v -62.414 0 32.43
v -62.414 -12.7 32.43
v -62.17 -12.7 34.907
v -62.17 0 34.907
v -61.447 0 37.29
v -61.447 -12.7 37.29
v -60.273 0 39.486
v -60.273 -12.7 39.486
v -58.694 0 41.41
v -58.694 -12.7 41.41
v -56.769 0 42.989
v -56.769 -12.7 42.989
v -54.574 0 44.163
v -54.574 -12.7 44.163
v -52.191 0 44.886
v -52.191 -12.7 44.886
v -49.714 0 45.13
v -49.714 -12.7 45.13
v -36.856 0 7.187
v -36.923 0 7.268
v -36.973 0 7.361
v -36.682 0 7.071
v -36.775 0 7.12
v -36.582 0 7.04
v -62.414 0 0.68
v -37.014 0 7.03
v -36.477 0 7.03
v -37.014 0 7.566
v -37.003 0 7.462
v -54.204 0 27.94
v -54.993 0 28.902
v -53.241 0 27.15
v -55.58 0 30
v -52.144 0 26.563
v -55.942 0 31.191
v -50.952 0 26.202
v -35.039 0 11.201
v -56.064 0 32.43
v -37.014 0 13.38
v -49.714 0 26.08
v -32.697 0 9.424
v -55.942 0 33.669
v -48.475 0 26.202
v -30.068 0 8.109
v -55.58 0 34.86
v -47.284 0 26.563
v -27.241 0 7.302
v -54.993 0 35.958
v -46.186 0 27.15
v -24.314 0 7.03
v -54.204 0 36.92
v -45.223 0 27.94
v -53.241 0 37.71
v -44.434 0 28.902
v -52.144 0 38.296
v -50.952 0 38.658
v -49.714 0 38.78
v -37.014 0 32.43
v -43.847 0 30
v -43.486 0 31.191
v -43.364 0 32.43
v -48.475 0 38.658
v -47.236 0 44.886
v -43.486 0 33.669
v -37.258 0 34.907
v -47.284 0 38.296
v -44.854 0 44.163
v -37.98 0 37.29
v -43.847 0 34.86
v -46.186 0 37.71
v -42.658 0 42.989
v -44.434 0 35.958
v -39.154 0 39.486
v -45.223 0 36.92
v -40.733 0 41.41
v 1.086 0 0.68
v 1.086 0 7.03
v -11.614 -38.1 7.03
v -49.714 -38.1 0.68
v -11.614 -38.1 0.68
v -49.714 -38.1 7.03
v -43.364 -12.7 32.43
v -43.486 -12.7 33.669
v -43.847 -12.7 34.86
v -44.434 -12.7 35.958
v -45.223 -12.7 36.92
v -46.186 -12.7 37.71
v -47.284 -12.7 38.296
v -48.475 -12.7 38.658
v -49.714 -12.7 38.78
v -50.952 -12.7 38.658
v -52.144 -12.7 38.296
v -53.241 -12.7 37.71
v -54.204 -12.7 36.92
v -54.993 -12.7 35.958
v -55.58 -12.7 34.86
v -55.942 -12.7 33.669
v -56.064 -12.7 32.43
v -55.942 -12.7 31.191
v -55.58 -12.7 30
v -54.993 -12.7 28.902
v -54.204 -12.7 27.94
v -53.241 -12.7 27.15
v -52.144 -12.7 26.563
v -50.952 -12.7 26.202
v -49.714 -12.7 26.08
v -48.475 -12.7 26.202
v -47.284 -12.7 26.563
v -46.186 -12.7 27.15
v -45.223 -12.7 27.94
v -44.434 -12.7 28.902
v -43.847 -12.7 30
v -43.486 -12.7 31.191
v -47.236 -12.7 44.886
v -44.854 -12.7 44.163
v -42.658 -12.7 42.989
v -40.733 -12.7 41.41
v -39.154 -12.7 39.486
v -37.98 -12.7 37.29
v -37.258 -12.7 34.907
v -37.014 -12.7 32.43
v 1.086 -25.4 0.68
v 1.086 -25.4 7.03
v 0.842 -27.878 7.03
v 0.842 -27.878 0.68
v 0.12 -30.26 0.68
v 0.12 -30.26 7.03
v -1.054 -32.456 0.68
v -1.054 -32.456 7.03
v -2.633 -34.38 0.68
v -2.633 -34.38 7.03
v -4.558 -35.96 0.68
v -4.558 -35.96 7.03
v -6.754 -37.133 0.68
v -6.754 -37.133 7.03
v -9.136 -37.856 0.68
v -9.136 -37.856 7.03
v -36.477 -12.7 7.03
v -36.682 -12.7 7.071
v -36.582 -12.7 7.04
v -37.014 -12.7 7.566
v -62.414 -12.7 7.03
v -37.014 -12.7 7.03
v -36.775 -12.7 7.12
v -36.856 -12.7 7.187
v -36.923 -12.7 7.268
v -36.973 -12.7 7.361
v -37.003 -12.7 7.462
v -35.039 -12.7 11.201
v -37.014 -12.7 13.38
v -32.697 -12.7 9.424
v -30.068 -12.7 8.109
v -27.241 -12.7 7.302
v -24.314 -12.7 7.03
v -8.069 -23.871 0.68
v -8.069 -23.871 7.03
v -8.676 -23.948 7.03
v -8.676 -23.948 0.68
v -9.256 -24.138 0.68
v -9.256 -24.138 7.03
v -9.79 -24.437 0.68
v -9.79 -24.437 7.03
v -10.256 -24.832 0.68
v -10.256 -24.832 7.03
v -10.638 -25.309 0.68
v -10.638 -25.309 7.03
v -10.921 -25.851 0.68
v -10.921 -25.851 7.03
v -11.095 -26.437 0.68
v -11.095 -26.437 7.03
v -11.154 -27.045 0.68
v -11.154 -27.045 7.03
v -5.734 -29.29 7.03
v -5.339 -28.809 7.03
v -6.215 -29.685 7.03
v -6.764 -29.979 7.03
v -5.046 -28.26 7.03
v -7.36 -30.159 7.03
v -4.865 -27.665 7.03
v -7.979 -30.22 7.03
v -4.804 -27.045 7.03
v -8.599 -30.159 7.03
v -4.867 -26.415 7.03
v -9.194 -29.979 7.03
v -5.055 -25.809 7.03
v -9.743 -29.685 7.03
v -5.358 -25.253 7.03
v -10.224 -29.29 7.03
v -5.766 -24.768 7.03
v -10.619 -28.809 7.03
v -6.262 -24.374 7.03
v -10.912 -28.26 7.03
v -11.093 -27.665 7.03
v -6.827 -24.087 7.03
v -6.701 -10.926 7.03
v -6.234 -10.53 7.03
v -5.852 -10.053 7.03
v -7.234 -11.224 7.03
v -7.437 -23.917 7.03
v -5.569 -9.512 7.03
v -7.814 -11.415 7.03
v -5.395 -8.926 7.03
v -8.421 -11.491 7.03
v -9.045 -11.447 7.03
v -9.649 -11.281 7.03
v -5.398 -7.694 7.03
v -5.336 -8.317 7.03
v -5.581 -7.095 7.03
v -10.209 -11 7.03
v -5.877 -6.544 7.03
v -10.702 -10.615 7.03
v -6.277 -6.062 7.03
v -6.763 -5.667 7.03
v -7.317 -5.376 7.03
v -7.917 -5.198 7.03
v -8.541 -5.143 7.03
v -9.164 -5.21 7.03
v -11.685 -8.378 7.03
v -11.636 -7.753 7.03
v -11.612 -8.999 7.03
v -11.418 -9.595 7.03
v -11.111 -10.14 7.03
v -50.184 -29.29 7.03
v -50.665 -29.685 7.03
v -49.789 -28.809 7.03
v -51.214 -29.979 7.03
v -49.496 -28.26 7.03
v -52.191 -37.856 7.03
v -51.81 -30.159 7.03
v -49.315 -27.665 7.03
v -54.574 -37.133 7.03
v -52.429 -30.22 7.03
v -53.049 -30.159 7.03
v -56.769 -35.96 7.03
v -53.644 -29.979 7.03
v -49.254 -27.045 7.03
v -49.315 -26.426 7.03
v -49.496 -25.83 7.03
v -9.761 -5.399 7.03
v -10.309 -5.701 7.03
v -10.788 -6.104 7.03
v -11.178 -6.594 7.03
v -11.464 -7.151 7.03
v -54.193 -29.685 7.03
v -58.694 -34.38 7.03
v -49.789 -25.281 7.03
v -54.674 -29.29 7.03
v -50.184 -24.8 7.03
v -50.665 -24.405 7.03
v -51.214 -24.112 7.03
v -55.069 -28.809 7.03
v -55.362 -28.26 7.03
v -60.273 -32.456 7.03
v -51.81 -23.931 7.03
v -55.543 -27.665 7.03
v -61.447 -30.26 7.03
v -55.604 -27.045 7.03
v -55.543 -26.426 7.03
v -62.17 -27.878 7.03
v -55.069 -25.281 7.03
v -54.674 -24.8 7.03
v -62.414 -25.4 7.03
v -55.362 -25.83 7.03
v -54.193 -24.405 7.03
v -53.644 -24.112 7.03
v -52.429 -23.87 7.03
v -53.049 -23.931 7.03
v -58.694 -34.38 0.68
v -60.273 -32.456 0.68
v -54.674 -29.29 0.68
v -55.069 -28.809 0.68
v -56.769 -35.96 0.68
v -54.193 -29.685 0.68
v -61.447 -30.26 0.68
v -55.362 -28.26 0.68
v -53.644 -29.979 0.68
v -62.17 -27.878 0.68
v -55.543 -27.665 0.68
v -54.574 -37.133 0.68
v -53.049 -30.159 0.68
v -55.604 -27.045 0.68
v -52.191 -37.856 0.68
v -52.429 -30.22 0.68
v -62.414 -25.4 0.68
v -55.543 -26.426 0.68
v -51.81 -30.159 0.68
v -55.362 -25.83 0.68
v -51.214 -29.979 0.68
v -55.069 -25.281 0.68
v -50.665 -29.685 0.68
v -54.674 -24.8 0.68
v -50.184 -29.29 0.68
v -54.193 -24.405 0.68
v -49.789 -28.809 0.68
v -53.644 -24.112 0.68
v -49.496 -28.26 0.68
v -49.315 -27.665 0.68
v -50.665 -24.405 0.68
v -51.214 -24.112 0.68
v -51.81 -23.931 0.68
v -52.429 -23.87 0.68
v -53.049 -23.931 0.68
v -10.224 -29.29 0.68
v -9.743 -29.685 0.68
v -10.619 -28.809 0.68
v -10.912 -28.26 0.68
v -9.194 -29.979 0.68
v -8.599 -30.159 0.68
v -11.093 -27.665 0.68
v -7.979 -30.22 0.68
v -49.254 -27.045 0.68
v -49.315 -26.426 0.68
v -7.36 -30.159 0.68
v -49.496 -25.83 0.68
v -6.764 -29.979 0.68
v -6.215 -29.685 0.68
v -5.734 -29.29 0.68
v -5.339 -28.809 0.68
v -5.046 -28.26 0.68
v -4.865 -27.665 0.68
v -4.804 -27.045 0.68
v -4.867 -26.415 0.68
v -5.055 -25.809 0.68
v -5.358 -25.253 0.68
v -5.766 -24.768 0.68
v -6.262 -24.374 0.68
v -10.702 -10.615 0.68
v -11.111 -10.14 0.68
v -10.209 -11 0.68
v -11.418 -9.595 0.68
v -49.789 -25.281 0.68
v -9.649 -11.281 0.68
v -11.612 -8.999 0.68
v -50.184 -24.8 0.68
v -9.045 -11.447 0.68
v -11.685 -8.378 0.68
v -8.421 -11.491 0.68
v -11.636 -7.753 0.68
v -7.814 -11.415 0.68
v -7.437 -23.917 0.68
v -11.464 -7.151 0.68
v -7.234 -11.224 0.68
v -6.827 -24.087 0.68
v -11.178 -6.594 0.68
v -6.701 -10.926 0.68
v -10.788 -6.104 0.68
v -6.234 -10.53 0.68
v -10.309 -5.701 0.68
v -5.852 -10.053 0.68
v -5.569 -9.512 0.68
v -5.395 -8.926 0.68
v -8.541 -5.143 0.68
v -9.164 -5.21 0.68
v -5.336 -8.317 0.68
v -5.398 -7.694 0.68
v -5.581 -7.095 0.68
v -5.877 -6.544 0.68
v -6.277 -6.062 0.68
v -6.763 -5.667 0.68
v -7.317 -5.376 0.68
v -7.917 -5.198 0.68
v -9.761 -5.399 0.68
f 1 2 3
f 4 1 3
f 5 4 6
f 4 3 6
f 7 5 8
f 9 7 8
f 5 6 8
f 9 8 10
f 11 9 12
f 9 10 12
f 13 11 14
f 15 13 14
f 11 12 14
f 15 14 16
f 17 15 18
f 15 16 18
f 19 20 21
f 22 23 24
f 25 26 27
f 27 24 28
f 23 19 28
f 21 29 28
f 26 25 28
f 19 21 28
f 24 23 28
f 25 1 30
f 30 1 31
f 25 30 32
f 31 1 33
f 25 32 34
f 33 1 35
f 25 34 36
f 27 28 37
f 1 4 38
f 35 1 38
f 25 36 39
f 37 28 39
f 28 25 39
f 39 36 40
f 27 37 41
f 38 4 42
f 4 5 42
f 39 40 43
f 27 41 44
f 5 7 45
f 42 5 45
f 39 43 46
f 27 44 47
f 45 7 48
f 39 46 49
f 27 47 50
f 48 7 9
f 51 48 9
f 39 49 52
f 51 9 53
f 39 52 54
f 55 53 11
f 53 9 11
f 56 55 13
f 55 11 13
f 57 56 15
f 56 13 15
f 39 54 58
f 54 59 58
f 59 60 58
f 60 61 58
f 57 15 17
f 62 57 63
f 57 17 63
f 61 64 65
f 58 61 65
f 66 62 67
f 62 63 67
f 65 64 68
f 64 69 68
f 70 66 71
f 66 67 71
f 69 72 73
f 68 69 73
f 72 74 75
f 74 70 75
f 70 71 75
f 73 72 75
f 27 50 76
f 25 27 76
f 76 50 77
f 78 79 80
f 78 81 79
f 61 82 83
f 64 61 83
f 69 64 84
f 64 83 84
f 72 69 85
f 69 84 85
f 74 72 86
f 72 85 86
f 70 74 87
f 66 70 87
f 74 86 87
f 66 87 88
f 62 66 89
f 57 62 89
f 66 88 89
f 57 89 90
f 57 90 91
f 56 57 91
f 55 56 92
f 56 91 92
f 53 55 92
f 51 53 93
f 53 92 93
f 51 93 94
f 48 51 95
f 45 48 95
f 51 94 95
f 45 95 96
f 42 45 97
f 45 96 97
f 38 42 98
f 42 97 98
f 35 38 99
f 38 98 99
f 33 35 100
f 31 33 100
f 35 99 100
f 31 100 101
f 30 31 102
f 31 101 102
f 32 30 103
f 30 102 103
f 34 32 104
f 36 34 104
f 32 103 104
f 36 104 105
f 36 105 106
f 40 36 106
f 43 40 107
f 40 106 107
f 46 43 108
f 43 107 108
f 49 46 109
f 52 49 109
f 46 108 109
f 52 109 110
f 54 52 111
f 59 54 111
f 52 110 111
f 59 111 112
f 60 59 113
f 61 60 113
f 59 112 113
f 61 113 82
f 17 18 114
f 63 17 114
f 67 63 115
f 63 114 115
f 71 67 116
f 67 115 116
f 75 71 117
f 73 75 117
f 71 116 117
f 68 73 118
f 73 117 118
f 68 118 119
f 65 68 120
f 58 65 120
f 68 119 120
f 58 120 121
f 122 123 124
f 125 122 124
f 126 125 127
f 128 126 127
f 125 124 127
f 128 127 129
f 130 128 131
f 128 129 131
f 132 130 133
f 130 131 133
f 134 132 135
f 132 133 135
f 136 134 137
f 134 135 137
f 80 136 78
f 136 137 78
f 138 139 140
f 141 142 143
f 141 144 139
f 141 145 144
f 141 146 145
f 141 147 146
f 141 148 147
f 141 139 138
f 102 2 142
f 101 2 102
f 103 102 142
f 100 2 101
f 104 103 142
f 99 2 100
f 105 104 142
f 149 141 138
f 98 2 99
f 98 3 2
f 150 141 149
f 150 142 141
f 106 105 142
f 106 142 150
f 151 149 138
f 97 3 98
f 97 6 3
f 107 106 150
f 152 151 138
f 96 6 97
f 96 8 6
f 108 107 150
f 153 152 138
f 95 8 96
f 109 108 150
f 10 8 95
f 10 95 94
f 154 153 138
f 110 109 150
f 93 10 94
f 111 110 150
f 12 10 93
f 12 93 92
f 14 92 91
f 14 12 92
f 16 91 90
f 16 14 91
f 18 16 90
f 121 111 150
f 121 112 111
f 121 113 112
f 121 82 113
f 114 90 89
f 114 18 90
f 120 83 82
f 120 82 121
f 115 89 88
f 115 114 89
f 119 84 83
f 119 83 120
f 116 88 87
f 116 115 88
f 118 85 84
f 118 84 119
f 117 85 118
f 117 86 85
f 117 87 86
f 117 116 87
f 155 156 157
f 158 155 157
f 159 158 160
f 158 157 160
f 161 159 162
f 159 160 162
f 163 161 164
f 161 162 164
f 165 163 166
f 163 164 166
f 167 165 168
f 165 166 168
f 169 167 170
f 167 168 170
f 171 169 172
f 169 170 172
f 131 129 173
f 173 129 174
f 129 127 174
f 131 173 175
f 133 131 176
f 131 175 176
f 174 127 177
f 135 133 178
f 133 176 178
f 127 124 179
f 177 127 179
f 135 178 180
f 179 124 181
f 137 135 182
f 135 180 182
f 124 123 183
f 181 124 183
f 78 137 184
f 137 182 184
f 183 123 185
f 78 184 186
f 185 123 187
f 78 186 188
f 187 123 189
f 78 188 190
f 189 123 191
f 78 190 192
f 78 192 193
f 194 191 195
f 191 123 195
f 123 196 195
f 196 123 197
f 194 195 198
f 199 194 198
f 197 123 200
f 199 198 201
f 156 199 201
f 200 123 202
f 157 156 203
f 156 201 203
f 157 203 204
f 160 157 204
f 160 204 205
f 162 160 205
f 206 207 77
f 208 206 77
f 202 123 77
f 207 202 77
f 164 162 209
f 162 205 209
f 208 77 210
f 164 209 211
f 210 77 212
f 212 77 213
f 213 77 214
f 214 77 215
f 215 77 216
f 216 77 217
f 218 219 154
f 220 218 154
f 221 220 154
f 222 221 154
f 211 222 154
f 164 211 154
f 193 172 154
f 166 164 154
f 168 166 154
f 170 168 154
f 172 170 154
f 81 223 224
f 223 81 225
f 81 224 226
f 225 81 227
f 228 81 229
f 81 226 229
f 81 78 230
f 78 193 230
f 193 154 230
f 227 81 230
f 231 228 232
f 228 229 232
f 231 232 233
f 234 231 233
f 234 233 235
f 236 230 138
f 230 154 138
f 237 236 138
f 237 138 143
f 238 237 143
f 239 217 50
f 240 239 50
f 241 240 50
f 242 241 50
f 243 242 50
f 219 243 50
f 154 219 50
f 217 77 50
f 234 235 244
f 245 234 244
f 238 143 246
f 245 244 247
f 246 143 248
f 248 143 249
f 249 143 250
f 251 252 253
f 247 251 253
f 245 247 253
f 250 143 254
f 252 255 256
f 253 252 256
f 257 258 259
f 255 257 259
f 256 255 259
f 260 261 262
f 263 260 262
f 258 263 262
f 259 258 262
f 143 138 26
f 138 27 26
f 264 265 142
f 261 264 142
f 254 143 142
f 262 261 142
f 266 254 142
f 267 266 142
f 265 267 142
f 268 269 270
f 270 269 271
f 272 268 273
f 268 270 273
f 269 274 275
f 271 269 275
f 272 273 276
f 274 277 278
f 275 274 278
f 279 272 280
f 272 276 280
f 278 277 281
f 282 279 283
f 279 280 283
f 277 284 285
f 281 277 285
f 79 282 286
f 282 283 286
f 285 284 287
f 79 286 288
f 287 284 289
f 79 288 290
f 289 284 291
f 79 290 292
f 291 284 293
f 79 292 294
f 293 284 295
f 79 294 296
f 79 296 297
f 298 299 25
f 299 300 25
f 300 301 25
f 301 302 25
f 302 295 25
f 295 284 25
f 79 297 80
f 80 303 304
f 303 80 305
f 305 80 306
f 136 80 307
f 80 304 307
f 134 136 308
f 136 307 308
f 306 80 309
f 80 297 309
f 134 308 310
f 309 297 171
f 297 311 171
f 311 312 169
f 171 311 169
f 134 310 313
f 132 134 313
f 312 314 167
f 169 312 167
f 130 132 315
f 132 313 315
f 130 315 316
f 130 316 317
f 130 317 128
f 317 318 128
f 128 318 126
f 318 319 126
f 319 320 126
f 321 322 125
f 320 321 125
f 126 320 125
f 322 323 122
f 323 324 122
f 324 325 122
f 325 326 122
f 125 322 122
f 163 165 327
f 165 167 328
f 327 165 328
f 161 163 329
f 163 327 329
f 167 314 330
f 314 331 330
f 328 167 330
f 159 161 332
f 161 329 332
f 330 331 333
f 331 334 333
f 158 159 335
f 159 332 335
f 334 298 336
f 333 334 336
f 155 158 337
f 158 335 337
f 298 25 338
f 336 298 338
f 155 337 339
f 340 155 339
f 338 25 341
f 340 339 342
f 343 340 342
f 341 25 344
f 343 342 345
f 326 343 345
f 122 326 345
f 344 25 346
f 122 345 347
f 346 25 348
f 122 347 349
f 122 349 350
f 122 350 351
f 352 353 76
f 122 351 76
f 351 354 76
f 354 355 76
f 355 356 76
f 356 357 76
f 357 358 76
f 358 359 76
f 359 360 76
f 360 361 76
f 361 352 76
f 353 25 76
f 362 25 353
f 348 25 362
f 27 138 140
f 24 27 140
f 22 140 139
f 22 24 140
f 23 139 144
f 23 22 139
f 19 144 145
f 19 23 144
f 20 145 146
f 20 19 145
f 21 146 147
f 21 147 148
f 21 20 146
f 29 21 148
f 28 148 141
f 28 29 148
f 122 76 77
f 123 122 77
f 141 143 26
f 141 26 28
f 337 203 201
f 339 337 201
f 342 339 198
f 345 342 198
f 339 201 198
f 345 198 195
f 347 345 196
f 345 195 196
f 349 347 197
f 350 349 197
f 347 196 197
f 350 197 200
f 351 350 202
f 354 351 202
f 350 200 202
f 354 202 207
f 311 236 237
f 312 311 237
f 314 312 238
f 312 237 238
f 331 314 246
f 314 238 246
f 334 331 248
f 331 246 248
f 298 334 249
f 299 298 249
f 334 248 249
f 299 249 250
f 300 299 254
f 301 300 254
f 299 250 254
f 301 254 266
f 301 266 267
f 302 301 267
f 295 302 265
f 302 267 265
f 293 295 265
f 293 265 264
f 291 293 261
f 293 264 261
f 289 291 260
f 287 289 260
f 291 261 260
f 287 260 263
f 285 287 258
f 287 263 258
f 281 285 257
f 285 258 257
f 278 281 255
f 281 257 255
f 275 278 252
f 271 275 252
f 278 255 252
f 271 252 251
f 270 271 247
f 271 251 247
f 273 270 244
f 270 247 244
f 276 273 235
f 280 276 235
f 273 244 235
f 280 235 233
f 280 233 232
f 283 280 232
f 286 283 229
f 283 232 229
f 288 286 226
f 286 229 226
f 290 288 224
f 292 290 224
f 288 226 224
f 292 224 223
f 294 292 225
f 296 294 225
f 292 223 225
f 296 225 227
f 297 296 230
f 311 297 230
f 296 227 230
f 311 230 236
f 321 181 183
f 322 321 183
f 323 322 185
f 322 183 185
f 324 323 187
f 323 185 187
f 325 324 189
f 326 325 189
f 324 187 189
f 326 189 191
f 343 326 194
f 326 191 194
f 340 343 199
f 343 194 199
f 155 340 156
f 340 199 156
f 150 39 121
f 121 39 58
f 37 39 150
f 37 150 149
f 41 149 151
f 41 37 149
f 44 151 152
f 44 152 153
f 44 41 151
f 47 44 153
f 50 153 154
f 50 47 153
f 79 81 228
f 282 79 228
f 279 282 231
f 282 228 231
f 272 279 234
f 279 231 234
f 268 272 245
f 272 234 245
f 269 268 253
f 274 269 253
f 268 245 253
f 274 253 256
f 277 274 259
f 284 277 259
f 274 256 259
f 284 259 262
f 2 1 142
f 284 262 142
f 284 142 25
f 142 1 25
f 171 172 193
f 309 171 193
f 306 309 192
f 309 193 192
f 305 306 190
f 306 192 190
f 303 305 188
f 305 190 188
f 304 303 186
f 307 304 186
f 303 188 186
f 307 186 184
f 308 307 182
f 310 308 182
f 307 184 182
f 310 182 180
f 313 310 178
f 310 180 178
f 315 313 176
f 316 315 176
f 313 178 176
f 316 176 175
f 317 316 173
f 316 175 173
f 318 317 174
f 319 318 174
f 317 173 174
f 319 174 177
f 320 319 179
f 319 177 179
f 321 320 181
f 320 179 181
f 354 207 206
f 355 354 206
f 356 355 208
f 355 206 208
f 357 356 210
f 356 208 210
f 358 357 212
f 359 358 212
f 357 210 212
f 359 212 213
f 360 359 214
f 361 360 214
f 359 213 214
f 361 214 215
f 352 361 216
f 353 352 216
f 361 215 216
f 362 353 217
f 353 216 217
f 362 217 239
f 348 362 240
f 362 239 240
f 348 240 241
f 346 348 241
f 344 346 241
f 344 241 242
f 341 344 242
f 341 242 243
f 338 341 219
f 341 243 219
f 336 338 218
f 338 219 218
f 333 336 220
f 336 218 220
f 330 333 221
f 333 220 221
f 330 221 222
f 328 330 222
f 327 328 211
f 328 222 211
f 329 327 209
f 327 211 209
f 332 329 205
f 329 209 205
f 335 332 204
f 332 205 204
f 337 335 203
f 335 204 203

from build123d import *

# Parameters (mm, degrees)
F1_DEPTH  = 38.1
F2_W      = 25.4
F2_H      = 38.1
F3_DEPTH  = 25.4
F4_R      = 6.35
F5_DEPTH  = 12.7
F7_DEPTH  = 6.35
F6_R      = 3.175
F8_DEPTH  = 6.35
F10_DEPTH = 12.7


with BuildPart() as f1:
    # F0 (on Front) → F1 (new body)
    with BuildSketch(Plane.XZ):
        Polygon((-37.0136184096, 45.1297735606), (-62.4136184096, 45.1297735606), (-62.4136184096, 0.6797735606), (1.0863815904, 0.6797735606), (1.0863815904, 7.0297735606), (-37.0136184096, 7.0297735606), align=None)
    extrude(amount=F1_DEPTH)

    # F2 (on face) → F3 (cut)
    with BuildSketch(Plane.XZ.offset(38.1)):
        with Locations((-49.7136184096, 26.0797735606)):
            Rectangle(F2_W, F2_H)
    extrude(amount=-F3_DEPTH, mode=Mode.SUBTRACT)

    # F4 (on face) → F5 (cut)
    with BuildSketch(Plane.XZ.offset(12.7)):
        with BuildLine():
            Line((-62.4136184096, 45.1297735606), (-62.4136184096, 32.4297735606))
            ThreePointArc((-62.4136184096, 32.4297735606), (-58.6938745306, 41.4100296816), (-49.7136184096, 45.1297735606))
            Line((-49.7136184096, 45.1297735606), (-62.4136184096, 45.1297735606))
        make_face()
        with BuildLine():
            Line((-37.0136184096, 45.1297735606), (-49.7136184096, 45.1297735606))
            ThreePointArc((-49.7136184096, 45.1297735606), (-40.7333622885, 41.4100296816), (-37.0136184096, 32.4297735606))
            Line((-37.0136184096, 32.4297735606), (-37.0136184096, 45.1297735606))
        make_face()
        with Locations((-49.7136184096, 32.4297735606)):
            Circle(F4_R)
    extrude(amount=-F5_DEPTH, mode=Mode.SUBTRACT)

    # F6 (on face) → F7 (cut)
    with BuildSketch(Plane.XY.offset(7.0297735606)):
        with BuildLine():
            Line((1.0863815904, -38.1), (1.0863815904, -25.4))
            ThreePointArc((1.0863815904, -25.4), (-2.6333622885, -34.3802561211), (-11.6136184096, -38.1))
            Line((-11.6136184096, -38.1), (1.0863815904, -38.1))
        make_face()
        with BuildLine():
            Line((-62.4136184096, -38.1), (-49.7136184096, -38.1))
            ThreePointArc((-49.7136184096, -38.1), (-58.6938745306, -34.3802561211), (-62.4136184096, -25.4))
            Line((-62.4136184096, -25.4), (-62.4136184096, -38.1))
        make_face()
    extrude(amount=-F7_DEPTH, mode=Mode.SUBTRACT)

    # F6 (on face) → F8 (cut)
    with BuildSketch(Plane.XY.offset(7.0297735606)):
        with BuildLine():
            ThreePointArc((-8.4208896913, -11.4911545114), (-6.2343188315, -10.5303998816), (-5.3360288183, -8.3174343067))
            ThreePointArc((-5.3360288183, -8.3174343067), (-10.7877388051, -6.1044687317), (-8.4208896913, -11.4911545114))
        make_face()
        with Locations((-52.429128431, -27.0451839786)):
            Circle(F6_R)
        with BuildLine():
            ThreePointArc((-4.804128431, -27.0451839786), (-5.7661628561, -24.7684739918), (-8.069267558, -23.8714637739))
            Line((-8.069267558, -23.8714637739), (-7.979128431, -27.0451839786))
            Line((-7.979128431, -27.0451839786), (-11.154128431, -27.0451839786))
            ThreePointArc((-11.154128431, -27.0451839786), (-7.979128431, -30.2201839786), (-4.804128431, -27.0451839786))
        make_face()
        with BuildLine():
            Line((-7.979128431, -27.0451839786), (-8.069267558, -23.8714637739))
            ThreePointArc((-8.069267558, -23.8714637739), (-10.2558384179, -24.8322184036), (-11.154128431, -27.0451839786))
            Line((-11.154128431, -27.0451839786), (-7.979128431, -27.0451839786))
        make_face()
    extrude(amount=-F8_DEPTH, mode=Mode.SUBTRACT)

    # F9 (on face) → F10 (join)
    with BuildSketch(Plane(origin=(0, 0, 0), x_dir=(-1, 0, 0), z_dir=(0, 1, 0))):
        with BuildLine():
            Line((37.0136184096, 7.5662416692), (37.0136184096, 13.3797735606))
            ThreePointArc((37.0136184096, 13.3797735606), (31.4131342381, 8.7057419035), (24.3136184096, 7.0297735606))
            Line((24.3136184096, 7.0297735606), (36.477150301, 7.0297735606))
            ThreePointArc((36.477150301, 7.0297735606), (36.8564905385, 7.1869014317), (37.0136184096, 7.5662416692))
        make_face()
    extrude(amount=-F10_DEPTH)


solid = f1.part
